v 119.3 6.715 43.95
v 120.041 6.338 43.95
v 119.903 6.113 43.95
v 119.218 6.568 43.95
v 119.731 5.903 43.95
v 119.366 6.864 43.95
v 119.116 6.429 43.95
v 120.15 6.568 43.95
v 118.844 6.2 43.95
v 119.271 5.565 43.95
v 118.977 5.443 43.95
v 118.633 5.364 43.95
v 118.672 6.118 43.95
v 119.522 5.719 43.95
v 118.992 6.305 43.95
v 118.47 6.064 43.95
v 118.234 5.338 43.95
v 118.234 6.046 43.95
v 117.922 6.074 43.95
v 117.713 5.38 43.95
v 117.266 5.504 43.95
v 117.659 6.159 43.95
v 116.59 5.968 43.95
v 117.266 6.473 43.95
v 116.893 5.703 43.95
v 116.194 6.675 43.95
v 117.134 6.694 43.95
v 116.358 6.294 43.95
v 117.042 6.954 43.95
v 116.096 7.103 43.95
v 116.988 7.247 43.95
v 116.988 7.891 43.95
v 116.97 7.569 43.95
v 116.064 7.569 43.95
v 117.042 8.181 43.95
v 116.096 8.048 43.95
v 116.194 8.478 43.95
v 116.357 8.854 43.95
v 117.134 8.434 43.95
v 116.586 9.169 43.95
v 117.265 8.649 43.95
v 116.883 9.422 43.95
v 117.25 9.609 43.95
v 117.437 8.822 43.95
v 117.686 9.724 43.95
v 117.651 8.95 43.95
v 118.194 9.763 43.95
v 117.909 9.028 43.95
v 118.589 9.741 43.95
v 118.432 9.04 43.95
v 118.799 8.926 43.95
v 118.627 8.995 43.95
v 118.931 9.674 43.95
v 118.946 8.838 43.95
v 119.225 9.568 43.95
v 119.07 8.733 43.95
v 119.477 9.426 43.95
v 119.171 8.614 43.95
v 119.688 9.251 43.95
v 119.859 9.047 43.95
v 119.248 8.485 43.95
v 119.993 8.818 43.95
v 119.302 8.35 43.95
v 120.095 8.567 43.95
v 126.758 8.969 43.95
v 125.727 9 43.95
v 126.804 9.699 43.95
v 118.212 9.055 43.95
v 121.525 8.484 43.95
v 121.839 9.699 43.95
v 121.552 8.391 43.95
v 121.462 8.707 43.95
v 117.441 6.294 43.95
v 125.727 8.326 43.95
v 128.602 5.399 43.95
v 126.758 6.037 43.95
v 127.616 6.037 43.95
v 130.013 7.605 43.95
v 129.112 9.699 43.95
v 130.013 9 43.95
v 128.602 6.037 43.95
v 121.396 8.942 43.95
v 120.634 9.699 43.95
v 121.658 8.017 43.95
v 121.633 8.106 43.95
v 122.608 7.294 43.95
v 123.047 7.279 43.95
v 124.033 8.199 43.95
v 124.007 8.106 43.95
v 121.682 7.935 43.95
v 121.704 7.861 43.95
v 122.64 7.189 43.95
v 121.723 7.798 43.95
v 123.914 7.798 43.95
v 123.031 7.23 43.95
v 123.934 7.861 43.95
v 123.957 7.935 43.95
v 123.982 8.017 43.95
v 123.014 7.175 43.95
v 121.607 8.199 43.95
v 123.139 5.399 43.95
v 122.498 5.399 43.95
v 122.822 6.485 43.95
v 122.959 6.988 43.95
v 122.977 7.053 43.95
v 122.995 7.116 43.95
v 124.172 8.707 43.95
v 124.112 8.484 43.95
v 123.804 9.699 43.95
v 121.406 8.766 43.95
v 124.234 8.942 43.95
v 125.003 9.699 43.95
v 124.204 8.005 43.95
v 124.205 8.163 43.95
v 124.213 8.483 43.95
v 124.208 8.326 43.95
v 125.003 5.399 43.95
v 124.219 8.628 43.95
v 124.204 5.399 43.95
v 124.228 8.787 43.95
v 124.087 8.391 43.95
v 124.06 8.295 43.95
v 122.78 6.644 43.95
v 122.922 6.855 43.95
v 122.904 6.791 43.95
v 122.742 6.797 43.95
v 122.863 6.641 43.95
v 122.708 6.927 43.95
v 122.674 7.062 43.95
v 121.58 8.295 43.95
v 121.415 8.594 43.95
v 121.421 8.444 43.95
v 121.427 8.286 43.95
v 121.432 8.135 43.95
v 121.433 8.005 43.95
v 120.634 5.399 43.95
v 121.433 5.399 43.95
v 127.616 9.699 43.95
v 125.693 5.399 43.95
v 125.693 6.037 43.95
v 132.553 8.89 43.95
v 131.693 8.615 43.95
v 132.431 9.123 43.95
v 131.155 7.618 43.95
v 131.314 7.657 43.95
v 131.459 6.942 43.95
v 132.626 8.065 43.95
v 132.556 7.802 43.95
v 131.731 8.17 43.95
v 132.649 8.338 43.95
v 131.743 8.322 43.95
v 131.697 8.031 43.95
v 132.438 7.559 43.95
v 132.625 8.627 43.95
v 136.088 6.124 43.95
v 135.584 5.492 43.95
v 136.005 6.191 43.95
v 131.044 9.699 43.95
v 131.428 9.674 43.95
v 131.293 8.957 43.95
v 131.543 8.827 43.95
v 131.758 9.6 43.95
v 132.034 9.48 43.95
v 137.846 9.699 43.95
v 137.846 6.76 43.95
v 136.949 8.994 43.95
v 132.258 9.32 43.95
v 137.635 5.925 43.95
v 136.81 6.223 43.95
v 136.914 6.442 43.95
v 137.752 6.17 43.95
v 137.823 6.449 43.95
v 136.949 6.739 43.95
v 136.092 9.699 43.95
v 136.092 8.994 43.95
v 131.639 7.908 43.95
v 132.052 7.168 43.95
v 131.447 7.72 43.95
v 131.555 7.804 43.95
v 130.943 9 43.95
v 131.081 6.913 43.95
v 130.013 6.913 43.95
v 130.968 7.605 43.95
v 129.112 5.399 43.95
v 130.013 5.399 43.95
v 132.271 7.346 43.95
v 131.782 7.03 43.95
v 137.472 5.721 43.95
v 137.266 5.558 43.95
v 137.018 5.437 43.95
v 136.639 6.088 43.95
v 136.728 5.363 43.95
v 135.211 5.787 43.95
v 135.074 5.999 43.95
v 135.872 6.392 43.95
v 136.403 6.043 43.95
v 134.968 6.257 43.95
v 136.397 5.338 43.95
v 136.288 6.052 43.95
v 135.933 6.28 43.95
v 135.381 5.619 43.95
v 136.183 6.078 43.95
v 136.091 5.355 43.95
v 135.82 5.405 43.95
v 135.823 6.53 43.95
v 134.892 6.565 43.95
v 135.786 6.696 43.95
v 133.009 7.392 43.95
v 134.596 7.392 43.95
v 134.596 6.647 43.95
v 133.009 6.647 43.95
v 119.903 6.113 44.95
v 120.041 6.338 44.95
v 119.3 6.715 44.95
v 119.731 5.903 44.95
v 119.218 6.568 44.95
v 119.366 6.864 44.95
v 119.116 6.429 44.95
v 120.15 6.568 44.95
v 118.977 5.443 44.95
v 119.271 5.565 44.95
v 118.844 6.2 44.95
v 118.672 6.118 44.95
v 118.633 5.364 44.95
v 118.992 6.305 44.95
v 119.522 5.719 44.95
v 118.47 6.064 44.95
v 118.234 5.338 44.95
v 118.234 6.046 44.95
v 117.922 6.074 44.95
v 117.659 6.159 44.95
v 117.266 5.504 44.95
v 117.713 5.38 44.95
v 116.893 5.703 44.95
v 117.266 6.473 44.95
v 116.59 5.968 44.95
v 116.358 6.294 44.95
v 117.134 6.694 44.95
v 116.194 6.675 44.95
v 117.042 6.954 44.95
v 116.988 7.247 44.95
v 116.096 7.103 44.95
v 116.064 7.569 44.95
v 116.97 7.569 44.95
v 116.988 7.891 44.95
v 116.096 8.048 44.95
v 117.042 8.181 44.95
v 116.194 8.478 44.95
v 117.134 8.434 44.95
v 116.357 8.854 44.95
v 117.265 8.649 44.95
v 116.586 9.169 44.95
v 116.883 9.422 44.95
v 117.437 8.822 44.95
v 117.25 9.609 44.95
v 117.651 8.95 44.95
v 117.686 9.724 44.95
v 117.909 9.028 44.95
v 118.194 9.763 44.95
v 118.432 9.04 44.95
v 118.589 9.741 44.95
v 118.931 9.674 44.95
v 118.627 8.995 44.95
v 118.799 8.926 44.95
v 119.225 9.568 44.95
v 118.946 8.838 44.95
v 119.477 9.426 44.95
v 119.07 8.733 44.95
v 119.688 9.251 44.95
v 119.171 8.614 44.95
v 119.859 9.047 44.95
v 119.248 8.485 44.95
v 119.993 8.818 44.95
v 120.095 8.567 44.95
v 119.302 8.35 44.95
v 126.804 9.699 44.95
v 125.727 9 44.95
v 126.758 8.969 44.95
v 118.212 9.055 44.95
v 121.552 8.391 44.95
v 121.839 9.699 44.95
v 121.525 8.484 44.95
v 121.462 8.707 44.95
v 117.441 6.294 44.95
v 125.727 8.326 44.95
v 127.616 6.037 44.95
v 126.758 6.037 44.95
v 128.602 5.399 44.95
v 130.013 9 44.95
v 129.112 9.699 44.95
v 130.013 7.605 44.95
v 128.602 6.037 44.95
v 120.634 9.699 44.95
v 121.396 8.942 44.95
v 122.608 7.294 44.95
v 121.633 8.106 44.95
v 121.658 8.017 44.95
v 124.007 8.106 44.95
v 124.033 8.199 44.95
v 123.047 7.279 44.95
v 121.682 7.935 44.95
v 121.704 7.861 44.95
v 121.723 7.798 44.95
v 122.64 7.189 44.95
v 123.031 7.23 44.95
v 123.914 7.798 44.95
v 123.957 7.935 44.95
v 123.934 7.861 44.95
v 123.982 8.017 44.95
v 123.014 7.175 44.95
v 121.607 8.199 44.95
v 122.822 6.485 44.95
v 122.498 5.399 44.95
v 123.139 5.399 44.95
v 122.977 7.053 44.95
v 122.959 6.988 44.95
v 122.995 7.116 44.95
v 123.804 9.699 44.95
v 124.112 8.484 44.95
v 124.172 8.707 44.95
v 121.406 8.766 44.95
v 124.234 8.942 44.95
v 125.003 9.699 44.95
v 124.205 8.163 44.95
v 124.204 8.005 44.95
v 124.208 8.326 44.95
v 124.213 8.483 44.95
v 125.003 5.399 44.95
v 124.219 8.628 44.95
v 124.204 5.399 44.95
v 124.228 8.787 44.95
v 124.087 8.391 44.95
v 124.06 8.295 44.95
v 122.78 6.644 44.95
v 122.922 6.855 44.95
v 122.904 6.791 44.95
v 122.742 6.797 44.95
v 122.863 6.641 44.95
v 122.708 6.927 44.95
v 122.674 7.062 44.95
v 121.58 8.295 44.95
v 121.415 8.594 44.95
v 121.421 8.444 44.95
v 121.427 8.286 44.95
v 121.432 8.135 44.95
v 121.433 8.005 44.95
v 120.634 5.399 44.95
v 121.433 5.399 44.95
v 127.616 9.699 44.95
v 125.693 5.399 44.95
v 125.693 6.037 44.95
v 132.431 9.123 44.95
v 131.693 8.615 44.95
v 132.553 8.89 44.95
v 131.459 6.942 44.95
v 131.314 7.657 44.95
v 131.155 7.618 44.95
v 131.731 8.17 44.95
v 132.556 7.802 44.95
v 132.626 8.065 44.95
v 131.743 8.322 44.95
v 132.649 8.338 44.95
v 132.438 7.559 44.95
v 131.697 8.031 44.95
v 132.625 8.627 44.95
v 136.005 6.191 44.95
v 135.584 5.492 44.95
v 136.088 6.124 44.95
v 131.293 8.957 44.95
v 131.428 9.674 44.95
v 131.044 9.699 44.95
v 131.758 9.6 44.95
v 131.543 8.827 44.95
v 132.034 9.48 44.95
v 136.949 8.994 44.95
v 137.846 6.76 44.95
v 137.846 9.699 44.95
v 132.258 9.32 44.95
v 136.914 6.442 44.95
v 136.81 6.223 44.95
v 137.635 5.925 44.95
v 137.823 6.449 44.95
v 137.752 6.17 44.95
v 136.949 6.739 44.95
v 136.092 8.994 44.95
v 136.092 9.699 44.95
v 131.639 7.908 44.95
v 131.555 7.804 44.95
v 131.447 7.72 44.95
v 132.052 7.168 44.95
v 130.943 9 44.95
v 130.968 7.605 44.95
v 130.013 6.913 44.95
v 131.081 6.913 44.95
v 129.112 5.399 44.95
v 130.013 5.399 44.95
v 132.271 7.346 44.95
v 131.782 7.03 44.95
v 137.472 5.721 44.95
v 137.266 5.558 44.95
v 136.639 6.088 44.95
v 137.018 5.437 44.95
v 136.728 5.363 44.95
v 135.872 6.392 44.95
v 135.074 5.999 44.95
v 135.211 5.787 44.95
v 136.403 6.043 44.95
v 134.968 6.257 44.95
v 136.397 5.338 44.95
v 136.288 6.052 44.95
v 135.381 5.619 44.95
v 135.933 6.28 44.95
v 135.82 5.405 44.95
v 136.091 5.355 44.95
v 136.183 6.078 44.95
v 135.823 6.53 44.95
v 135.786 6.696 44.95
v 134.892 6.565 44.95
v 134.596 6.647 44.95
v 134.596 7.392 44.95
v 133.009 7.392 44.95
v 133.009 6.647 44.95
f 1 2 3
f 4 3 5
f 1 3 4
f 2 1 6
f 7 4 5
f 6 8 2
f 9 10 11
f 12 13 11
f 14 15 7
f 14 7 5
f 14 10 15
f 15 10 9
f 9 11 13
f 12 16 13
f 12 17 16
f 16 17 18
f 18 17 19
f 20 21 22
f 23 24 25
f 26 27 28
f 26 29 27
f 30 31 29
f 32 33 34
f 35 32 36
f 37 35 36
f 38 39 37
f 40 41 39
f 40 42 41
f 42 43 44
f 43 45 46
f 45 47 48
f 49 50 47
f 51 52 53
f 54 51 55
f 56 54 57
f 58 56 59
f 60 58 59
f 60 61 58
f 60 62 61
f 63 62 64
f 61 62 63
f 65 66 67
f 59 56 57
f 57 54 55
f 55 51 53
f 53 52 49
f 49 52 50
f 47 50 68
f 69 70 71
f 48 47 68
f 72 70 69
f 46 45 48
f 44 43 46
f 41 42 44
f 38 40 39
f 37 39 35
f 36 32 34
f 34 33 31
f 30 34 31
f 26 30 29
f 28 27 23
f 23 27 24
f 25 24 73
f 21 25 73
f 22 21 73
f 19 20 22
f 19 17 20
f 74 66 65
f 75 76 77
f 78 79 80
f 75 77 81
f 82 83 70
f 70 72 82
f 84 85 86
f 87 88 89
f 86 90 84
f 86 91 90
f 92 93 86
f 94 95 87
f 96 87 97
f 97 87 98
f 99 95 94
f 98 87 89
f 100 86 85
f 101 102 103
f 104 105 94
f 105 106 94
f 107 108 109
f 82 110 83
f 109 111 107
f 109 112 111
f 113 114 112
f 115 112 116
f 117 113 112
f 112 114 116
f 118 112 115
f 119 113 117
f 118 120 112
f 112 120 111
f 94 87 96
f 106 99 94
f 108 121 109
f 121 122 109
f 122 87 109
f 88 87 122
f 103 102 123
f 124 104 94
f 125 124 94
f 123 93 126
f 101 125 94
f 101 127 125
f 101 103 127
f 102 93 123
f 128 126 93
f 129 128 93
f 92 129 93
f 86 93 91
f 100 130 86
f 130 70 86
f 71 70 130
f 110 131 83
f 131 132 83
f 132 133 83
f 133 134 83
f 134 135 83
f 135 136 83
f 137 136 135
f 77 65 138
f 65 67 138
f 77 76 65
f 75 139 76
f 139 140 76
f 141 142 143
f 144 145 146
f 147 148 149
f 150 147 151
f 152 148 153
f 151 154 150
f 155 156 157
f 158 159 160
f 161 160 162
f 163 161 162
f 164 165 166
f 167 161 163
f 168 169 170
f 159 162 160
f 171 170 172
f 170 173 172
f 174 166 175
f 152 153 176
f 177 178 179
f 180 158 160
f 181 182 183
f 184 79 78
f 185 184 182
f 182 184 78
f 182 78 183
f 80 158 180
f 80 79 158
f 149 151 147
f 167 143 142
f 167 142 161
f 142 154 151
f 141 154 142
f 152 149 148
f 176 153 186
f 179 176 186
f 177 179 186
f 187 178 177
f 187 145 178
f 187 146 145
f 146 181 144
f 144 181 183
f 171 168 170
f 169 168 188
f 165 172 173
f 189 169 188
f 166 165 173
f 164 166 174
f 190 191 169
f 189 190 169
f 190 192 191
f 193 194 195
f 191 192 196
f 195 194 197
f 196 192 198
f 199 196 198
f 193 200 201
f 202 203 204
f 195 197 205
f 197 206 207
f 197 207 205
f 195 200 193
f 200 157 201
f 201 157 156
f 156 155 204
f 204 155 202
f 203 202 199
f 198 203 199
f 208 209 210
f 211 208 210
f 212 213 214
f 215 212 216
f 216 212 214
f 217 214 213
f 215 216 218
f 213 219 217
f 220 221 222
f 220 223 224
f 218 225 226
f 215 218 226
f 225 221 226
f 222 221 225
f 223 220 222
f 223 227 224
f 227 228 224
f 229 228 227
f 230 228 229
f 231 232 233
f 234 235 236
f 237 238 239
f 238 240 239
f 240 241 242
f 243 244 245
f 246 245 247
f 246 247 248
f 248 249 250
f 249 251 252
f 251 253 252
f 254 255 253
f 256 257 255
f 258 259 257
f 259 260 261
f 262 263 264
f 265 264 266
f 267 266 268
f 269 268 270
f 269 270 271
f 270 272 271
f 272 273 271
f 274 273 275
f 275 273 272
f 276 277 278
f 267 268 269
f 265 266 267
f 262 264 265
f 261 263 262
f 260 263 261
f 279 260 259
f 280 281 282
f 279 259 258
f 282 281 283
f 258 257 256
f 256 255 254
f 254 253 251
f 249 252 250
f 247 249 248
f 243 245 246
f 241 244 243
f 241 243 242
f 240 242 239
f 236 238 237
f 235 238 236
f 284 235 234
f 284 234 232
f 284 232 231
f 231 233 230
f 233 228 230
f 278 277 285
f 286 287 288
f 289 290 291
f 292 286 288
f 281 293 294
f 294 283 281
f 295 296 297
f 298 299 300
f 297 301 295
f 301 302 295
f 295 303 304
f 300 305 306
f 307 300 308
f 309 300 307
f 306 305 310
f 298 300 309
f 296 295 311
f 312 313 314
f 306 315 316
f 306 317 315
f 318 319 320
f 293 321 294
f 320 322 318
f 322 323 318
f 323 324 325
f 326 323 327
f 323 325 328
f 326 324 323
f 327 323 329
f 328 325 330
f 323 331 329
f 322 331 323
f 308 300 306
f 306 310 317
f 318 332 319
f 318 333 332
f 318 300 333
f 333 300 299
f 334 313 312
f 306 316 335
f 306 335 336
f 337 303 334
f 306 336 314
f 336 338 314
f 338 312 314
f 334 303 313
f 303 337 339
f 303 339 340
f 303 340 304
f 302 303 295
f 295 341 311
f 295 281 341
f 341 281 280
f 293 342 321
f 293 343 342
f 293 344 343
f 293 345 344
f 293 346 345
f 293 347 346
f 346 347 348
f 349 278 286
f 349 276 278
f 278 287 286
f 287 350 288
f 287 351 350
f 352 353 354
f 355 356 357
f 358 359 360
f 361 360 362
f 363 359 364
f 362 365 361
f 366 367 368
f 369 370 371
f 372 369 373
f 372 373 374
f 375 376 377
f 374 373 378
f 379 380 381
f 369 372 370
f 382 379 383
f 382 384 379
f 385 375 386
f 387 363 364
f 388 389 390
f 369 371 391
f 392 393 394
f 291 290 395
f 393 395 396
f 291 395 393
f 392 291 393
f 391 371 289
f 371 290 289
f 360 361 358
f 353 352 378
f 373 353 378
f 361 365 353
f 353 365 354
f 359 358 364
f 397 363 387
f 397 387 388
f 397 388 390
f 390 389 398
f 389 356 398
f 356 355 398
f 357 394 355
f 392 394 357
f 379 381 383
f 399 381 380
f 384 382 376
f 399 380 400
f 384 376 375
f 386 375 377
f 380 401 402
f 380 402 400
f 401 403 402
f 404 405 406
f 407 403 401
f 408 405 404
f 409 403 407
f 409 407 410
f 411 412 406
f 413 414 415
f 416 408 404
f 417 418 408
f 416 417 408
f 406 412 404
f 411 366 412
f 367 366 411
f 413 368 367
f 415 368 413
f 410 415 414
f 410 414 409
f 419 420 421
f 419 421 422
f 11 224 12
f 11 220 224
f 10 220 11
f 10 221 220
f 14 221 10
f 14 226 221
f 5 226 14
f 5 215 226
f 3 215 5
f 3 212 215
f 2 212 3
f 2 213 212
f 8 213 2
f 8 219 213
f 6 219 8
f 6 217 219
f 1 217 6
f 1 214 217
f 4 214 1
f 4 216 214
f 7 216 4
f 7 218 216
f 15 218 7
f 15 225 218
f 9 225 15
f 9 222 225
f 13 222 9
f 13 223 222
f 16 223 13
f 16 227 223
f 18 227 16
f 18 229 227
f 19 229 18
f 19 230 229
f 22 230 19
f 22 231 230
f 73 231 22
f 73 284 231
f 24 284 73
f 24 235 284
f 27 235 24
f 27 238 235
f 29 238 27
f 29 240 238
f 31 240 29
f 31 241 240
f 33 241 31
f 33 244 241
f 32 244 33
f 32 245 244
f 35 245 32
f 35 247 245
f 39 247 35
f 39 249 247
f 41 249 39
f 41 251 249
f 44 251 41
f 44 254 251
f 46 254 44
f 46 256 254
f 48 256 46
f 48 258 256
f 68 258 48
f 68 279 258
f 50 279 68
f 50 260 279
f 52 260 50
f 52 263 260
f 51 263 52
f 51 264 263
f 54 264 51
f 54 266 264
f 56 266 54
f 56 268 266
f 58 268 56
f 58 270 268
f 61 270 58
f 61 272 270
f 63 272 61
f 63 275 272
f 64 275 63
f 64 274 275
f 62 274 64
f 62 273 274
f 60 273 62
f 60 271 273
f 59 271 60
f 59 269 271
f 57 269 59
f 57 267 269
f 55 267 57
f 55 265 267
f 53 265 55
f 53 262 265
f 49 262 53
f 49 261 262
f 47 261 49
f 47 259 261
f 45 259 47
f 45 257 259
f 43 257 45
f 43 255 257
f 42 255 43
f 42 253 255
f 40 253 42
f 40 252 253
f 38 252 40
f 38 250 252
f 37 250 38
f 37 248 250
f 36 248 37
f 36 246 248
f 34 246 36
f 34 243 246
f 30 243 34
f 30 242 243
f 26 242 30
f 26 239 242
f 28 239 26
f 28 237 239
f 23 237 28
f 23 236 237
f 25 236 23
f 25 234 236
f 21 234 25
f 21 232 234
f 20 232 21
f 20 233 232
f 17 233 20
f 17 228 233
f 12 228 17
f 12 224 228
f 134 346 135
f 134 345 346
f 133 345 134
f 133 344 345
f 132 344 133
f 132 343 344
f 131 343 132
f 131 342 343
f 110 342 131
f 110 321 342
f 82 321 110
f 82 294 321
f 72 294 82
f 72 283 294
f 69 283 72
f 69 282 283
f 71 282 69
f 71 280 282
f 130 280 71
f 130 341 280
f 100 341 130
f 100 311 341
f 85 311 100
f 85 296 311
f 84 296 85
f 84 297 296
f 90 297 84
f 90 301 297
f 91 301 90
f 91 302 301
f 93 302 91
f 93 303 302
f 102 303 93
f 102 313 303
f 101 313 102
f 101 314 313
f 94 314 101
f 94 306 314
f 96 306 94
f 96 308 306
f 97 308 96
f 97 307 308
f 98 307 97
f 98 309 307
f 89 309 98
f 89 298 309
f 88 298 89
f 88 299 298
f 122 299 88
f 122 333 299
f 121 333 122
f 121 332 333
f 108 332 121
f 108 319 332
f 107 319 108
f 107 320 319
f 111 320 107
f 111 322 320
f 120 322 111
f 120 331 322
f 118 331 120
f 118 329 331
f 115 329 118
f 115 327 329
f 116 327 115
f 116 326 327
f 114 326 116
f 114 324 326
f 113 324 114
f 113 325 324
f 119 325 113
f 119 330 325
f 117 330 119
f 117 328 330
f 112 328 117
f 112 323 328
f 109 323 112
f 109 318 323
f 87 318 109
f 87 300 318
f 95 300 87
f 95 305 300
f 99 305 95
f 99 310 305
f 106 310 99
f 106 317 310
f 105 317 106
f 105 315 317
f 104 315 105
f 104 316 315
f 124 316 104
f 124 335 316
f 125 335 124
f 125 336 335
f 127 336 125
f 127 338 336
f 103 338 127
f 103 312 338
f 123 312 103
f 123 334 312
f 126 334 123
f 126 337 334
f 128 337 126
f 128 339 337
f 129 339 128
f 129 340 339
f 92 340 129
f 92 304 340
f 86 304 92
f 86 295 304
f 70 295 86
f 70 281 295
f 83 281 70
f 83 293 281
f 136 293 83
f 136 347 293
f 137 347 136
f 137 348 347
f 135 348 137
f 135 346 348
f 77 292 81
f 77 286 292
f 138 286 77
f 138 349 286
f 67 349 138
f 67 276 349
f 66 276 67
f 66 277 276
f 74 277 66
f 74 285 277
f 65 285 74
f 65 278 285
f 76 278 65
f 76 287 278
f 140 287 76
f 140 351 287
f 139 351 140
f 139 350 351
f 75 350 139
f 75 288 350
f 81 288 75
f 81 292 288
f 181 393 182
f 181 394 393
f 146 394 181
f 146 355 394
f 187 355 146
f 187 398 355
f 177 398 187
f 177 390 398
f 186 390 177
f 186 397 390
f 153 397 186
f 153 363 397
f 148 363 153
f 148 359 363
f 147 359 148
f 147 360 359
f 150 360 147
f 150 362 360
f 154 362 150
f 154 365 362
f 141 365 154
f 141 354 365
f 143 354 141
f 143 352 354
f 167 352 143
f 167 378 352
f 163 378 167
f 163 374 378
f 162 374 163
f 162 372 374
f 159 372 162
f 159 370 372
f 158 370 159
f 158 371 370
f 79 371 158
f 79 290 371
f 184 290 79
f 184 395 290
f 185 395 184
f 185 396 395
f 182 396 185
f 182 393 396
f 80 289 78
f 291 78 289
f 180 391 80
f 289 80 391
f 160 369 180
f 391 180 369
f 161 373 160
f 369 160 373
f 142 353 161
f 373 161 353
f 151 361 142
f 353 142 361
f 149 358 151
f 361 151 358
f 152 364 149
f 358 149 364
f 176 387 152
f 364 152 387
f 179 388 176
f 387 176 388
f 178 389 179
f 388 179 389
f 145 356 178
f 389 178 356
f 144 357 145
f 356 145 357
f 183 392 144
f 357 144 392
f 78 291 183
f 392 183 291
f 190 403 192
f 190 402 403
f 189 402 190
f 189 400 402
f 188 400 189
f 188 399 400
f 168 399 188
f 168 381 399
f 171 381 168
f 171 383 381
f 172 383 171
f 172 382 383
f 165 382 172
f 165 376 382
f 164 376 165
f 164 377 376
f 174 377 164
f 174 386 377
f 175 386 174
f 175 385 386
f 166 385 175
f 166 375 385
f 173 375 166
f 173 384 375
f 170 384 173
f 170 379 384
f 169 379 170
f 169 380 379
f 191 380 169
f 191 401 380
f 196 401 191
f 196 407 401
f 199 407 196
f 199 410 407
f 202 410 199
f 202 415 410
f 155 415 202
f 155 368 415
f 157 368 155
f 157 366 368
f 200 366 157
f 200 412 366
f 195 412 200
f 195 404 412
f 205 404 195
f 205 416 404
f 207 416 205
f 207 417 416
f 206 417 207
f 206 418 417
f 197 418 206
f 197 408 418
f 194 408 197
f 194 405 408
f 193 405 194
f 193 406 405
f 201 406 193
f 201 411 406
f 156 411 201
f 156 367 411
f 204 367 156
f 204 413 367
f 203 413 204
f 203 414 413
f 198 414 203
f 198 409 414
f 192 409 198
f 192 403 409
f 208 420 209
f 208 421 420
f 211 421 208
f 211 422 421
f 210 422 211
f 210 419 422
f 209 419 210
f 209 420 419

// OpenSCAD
// CM1P-J ID text, engraved 0.5 into the plate's top face (frame as cm1p_i_freecad.py).
translate([127, 7.5, 43.95]) linear_extrude(1) text("CM1P-J", size = 4.5, font = "Liberation Sans:style=Bold", halign = "center", valign = "center");
